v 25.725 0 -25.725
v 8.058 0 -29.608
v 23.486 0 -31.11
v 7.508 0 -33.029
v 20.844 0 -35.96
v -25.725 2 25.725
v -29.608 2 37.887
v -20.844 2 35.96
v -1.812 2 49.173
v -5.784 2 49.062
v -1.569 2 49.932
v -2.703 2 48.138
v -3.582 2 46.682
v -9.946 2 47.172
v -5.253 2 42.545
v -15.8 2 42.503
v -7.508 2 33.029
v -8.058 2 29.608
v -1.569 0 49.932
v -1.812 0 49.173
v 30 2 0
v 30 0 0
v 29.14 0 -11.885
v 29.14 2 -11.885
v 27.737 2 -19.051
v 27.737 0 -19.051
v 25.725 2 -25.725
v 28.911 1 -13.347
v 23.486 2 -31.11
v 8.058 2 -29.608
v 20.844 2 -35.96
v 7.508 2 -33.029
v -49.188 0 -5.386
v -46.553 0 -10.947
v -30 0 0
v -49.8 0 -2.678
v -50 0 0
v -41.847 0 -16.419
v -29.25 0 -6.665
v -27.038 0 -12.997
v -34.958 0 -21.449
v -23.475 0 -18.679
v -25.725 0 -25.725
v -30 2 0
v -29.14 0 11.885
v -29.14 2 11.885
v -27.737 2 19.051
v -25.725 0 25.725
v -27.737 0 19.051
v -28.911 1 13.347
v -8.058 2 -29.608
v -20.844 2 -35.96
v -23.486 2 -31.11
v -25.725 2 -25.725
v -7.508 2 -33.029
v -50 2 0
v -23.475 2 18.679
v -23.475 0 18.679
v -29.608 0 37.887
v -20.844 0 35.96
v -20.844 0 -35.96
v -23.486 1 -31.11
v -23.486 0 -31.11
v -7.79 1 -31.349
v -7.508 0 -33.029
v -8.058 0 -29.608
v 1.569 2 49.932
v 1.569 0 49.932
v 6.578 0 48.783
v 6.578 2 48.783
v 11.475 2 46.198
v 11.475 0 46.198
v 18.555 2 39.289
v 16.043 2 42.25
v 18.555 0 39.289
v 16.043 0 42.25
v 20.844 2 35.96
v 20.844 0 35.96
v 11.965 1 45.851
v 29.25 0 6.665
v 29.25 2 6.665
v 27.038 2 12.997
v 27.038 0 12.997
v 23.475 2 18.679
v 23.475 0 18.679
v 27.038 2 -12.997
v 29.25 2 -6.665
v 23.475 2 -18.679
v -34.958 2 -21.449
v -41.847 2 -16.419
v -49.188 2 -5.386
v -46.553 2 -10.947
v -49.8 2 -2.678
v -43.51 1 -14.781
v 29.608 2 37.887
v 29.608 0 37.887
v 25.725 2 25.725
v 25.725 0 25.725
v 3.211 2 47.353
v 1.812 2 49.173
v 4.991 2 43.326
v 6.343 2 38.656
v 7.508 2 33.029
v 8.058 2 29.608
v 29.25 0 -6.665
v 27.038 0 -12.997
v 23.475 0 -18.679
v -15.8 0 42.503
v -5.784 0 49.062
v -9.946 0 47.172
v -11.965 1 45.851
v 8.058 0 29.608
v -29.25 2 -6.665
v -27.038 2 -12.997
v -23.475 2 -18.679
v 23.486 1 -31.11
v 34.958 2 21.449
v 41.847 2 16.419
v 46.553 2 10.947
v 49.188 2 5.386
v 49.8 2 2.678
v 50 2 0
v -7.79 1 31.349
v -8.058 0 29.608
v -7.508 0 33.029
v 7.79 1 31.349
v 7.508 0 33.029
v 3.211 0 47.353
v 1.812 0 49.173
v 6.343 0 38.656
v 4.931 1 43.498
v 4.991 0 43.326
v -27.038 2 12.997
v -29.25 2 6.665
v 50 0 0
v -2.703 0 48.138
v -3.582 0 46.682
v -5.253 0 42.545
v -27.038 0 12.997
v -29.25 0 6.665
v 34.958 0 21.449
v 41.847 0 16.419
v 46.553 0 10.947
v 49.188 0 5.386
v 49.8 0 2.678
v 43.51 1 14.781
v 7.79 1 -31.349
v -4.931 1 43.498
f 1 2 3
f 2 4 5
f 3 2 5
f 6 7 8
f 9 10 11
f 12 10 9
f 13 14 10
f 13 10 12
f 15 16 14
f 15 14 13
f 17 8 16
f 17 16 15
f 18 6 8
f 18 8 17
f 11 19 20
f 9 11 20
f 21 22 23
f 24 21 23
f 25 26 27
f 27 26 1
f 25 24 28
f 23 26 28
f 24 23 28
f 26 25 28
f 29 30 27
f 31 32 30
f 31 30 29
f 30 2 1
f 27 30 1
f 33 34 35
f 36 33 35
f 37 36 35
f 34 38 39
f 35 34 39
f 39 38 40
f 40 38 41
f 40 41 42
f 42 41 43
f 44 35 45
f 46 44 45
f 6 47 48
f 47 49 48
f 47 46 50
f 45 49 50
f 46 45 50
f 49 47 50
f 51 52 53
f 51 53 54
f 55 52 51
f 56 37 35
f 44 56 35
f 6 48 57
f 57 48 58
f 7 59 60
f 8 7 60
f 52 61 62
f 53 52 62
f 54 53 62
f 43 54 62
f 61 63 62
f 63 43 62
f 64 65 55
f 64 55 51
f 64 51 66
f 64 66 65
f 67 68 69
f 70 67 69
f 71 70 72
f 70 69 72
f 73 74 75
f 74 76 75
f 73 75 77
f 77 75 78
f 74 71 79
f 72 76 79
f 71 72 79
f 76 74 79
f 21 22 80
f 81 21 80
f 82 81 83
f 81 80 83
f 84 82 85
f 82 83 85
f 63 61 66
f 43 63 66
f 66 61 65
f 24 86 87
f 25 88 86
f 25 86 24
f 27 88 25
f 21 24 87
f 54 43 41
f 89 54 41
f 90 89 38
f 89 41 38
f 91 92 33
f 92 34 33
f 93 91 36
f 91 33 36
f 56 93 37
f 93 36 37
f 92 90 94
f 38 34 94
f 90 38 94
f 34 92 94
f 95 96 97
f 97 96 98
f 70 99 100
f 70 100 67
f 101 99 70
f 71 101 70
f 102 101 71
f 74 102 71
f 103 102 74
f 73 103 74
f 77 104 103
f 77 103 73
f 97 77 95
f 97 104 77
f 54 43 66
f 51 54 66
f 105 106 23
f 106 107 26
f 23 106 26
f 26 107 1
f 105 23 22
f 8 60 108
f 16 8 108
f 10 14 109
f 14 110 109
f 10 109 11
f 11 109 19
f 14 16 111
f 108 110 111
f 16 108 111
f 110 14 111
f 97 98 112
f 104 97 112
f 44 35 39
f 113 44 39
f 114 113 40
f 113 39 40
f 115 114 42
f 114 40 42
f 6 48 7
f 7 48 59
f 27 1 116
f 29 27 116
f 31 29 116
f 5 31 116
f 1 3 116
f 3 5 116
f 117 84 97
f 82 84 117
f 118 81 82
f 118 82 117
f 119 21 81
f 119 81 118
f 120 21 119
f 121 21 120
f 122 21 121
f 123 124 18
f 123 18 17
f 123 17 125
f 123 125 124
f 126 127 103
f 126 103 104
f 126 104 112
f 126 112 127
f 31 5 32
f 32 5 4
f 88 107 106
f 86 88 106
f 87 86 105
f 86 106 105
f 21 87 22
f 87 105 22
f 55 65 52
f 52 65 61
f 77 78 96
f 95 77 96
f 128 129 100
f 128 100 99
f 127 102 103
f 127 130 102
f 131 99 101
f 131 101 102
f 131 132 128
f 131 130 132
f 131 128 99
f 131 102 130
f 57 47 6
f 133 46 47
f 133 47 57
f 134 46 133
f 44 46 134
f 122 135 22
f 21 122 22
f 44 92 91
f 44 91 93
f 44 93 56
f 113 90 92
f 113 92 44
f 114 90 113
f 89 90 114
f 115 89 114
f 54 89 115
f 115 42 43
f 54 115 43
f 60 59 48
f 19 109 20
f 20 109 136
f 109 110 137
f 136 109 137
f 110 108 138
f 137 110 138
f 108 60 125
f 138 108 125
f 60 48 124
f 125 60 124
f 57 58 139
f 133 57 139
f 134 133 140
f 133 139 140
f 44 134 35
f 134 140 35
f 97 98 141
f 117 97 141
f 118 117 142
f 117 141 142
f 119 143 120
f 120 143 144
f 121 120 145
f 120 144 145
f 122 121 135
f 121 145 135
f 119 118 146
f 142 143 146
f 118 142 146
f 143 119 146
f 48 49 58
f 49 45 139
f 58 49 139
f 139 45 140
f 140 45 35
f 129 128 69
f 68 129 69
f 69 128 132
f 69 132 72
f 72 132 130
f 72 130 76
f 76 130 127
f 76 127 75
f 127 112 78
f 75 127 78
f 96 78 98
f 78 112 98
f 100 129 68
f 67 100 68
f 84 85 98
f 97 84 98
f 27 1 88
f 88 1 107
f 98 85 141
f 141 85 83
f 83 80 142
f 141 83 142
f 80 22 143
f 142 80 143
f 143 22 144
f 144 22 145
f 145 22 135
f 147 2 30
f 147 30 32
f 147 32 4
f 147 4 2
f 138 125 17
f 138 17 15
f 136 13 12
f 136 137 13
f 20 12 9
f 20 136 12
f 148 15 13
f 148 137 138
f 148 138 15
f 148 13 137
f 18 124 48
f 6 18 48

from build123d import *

# Parameters (mm, degrees)
DODANIE_WYCI_GNI_CIE1_DEPTH   = 2
DODANIE_WYCI_GNI_CIE1_2_DEPTH = 2
DODANIE_WYCI_GNI_CIE1_3_DEPTH = 2
DODANIE_WYCI_GNI_CIE1_4_DEPTH = 2
DODANIE_WYCI_GNI_CIE1_5_DEPTH = 2
DODANIE_WYCI_GNI_CIE1_6_DEPTH = 2
DODANIE_WYCI_GNI_CIE1_7_DEPTH = 2
DODANIE_WYCI_GNI_CIE1_8_DEPTH = 2


with BuildPart() as part:
    # Szkic1 → Dodanie-wyciągnięcie1 (new body)
    with BuildSketch(Plane(origin=(0, 0, 0), x_dir=(1, 0, 0), z_dir=(0, 1, 0))):
        with BuildLine():
            Line((-25.724787771, 25.724787771), (-8.05822964, 29.607826273))
            add(Edge.make_bspline(
                [(-7.507535684, 33.029118956), (-7.79792239, 31.378992774), (-8.05822964, 29.607826273)],
                knots=[0.849202104, 0.849202104, 0.849202104, 0.937063931, 0.937063931, 0.937063931], degree=2, weights=[1, 0.999035193, 1]))
            Line((-7.507535684, 33.029118956), (-20.843852414, 35.960387795))
            add(Edge.make_bspline(
                [(-20.843852414, 35.960387795), (-23.68927397, 31.378992774), (-25.724787771, 25.724787771)],
                knots=[3.909727591, 3.909727591, 3.909727591, 4.17196948, 4.17196948, 4.17196948], degree=2, weights=[1, 0.991415958, 1]))
        make_face()
    extrude(amount=DODANIE_WYCI_GNI_CIE1_DEPTH)


with BuildPart() as body_2:
    # Szkic1 → Dodanie-wyci_gni_cie1 2 (new body)
    with BuildSketch(Plane(origin=(0, 0, 0), x_dir=(1, 0, 0), z_dir=(0, 1, 0))):
        with BuildLine():
            Line((-23.475270357, 18.679177757), (-25.724787771, 25.724787771))
            add(Edge.make_bspline(
                [(-25.724787771, 25.724787771), (-50, 16.985711369), (-50, 0)],
                knots=[2.111215827, 2.111215827, 2.111215827, 3.141592654, 3.141592654, 3.141592654], degree=2, weights=[1, 0.870199907, 1]))
            Line((-50, 0), (-30, 0))
            ThreePointArc((-30, 9.5e-08), (-28.321882961, 9.892974554), (-23.475270357, 18.679177757))
        make_face()
    extrude(amount=DODANIE_WYCI_GNI_CIE1_2_DEPTH)


with BuildPart() as body_3:
    # Szkic1 → Dodanie-wyci_gni_cie1 3 (new body)
    with BuildSketch(Plane(origin=(0, 0, 0), x_dir=(1, 0, 0), z_dir=(0, 1, 0))):
        with BuildLine():
            ThreePointArc((-23.475270357, -18.679177757), (-28.321882992, -9.892974465), (-30, 9.5e-08))
            add(Edge.make_bspline(
                [(-30, 9.5e-08), (-30.000000016, -13.849198204), (-25.724787771, -25.724787771)],
                knots=[4.712388978, 4.712388978, 4.712388978, 5.252808481, 5.252808481, 5.252808481], degree=2, weights=[1, 0.963714928, 1]))
            Line((-25.724787771, -25.724787771), (-23.475270357, -18.679177757))
        make_face()
    extrude(amount=DODANIE_WYCI_GNI_CIE1_3_DEPTH)


with BuildPart() as body_4:
    # Szkic1 → Dodanie-wyci_gni_cie1 4 (new body)
    with BuildSketch(Plane(origin=(0, 0, 0), x_dir=(1, 0, 0), z_dir=(0, 1, 0))):
        with BuildLine():
            Line((-29.607826273, -37.88667404), (-20.843852414, -35.960387795))
            add(Edge.make_bspline(
                [(-20.843852414, -35.960387795), (-12.774167321, -48.953336072), (-1.56928672, -49.931545896)],
                knots=[5.51505037, 5.51505037, 5.51505037, 6.230851865, 6.230851865, 6.230851865], degree=2, weights=[1, 0.936634273, 1]))
            Line((-1.56928672, -49.931545896), (-1.811566447, -49.17271271))
            add(Edge.make_bspline(
                [(-7.507535684, -33.029118956), (-5.218865934, -46.034514162), (-1.811566447, -49.17271271)],
                knots=[2.292390549, 2.292390549, 2.292390549, 2.959430225, 2.959430225, 2.959430225], degree=2, weights=[1, 0.944895907, 1]))
            add(Edge.make_bspline(
                [(-8.05822964, -29.607826273), (-7.79792239, -31.378992774), (-7.507535684, -33.029118956)],
                knots=[2.204528722, 2.204528722, 2.204528722, 2.292390549, 2.292390549, 2.292390549], degree=2, weights=[1, 0.999035193, 1]))
            Line((-8.05822964, -29.607826273), (-25.724787771, -25.724787771))
            Line((-25.724787771, -25.724787771), (-29.607826273, -37.88667404))
        make_face()
    extrude(amount=DODANIE_WYCI_GNI_CIE1_4_DEPTH)


with BuildPart() as body_5:
    # Szkic1 → Dodanie-wyci_gni_cie1 5 (new body)
    with BuildSketch(Plane(origin=(0, 0, 0), x_dir=(1, 0, 0), z_dir=(0, 1, 0))):
        with BuildLine():
            Line((8.05822964, 29.607826273), (25.724787771, 25.724787771))
            add(Edge.make_bspline(
                [(25.724787771, 25.724787771), (23.68927397, 31.378992774), (20.843852414, 35.960387795)],
                knots=[2.111215827, 2.111215827, 2.111215827, 2.373457716, 2.373457716, 2.373457716], degree=2, weights=[1, 0.991415958, 1]))
            Line((20.843852414, 35.960387795), (7.507535684, 33.029118956))
            add(Edge.make_bspline(
                [(8.05822964, 29.607826273), (7.79792239, 31.378992774), (7.507535684, 33.029118956)],
                knots=[5.346121376, 5.346121376, 5.346121376, 5.433983203, 5.433983203, 5.433983203], degree=2, weights=[1, 0.999035193, 1]))
        make_face()
    extrude(amount=DODANIE_WYCI_GNI_CIE1_5_DEPTH)


with BuildPart() as body_6:
    # Szkic1 → Dodanie-wyci_gni_cie1 6 (new body)
    with BuildSketch(Plane(origin=(0, 0, 0), x_dir=(1, 0, 0), z_dir=(0, 1, 0))):
        with BuildLine():
            add(Edge.make_bspline(
                [(30, 0), (30, 13.849198247), (25.724787771, 25.724787771)],
                knots=[1.570796327, 1.570796327, 1.570796327, 2.111215827, 2.111215827, 2.111215827], degree=2, weights=[1, 0.963714928, 1]))
            Line((25.724787771, 25.724787771), (23.475270357, 18.679177757))
            ThreePointArc((23.475270357, 18.679177757), (28.321882977, 9.89297451), (30, 0))
        make_face()
    extrude(amount=DODANIE_WYCI_GNI_CIE1_6_DEPTH)


with BuildPart() as body_7:
    # Szkic1 → Dodanie-wyci_gni_cie1 7 (new body)
    with BuildSketch(Plane(origin=(0, 0, 0), x_dir=(1, 0, 0), z_dir=(0, 1, 0))):
        with BuildLine():
            Line((25.724787771, -25.724787771), (8.05822964, -29.607826273))
            add(Edge.make_bspline(
                [(7.507535684, -33.029118956), (7.79792239, -31.378992774), (8.05822964, -29.607826273)],
                knots=[3.990794758, 3.990794758, 3.990794758, 4.078656585, 4.078656585, 4.078656585], degree=2, weights=[1, 0.999035193, 1]))
            add(Edge.make_bspline(
                [(1.811566447, -49.17271271), (5.218865934, -46.034514162), (7.507535684, -33.029118956)],
                knots=[3.323755082, 3.323755082, 3.323755082, 3.990794758, 3.990794758, 3.990794758], degree=2, weights=[1, 0.944895907, 1]))
            Line((1.811566447, -49.17271271), (1.56928672, -49.931545896))
            add(Edge.make_bspline(
                [(1.56928672, -49.931545896), (12.774167321, -48.953336072), (20.843852414, -35.960387795)],
                knots=[0.052333442, 0.052333442, 0.052333442, 0.768134938, 0.768134938, 0.768134938], degree=2, weights=[1, 0.936634273, 1]))
            Line((20.843852414, -35.960387795), (29.607826273, -37.88667404))
            Line((29.607826273, -37.88667404), (25.724787771, -25.724787771))
        make_face()
    extrude(amount=DODANIE_WYCI_GNI_CIE1_7_DEPTH)


with BuildPart() as body_8:
    # Szkic1 → Dodanie-wyci_gni_cie1 8 (new body)
    with BuildSketch(Plane(origin=(0, 0, 0), x_dir=(1, 0, 0), z_dir=(0, 1, 0))):
        with BuildLine():
            Line((23.475270357, -18.679177757), (25.724787771, -25.724787771))
            add(Edge.make_bspline(
                [(25.724787771, -25.724787771), (50, -16.985711369), (50, 0)],
                knots=[5.252808481, 5.252808481, 5.252808481, 6.283185307, 6.283185307, 6.283185307], degree=2, weights=[1, 0.870199907, 1]))
            Line((50, 0), (30, 0))
            ThreePointArc((30, 0), (28.321882977, -9.89297451), (23.475270357, -18.679177757))
        make_face()
    extrude(amount=DODANIE_WYCI_GNI_CIE1_8_DEPTH)


solid = Compound([part.part, body_2.part, body_3.part, body_4.part, body_5.part, body_6.part, body_7.part, body_8.part])
